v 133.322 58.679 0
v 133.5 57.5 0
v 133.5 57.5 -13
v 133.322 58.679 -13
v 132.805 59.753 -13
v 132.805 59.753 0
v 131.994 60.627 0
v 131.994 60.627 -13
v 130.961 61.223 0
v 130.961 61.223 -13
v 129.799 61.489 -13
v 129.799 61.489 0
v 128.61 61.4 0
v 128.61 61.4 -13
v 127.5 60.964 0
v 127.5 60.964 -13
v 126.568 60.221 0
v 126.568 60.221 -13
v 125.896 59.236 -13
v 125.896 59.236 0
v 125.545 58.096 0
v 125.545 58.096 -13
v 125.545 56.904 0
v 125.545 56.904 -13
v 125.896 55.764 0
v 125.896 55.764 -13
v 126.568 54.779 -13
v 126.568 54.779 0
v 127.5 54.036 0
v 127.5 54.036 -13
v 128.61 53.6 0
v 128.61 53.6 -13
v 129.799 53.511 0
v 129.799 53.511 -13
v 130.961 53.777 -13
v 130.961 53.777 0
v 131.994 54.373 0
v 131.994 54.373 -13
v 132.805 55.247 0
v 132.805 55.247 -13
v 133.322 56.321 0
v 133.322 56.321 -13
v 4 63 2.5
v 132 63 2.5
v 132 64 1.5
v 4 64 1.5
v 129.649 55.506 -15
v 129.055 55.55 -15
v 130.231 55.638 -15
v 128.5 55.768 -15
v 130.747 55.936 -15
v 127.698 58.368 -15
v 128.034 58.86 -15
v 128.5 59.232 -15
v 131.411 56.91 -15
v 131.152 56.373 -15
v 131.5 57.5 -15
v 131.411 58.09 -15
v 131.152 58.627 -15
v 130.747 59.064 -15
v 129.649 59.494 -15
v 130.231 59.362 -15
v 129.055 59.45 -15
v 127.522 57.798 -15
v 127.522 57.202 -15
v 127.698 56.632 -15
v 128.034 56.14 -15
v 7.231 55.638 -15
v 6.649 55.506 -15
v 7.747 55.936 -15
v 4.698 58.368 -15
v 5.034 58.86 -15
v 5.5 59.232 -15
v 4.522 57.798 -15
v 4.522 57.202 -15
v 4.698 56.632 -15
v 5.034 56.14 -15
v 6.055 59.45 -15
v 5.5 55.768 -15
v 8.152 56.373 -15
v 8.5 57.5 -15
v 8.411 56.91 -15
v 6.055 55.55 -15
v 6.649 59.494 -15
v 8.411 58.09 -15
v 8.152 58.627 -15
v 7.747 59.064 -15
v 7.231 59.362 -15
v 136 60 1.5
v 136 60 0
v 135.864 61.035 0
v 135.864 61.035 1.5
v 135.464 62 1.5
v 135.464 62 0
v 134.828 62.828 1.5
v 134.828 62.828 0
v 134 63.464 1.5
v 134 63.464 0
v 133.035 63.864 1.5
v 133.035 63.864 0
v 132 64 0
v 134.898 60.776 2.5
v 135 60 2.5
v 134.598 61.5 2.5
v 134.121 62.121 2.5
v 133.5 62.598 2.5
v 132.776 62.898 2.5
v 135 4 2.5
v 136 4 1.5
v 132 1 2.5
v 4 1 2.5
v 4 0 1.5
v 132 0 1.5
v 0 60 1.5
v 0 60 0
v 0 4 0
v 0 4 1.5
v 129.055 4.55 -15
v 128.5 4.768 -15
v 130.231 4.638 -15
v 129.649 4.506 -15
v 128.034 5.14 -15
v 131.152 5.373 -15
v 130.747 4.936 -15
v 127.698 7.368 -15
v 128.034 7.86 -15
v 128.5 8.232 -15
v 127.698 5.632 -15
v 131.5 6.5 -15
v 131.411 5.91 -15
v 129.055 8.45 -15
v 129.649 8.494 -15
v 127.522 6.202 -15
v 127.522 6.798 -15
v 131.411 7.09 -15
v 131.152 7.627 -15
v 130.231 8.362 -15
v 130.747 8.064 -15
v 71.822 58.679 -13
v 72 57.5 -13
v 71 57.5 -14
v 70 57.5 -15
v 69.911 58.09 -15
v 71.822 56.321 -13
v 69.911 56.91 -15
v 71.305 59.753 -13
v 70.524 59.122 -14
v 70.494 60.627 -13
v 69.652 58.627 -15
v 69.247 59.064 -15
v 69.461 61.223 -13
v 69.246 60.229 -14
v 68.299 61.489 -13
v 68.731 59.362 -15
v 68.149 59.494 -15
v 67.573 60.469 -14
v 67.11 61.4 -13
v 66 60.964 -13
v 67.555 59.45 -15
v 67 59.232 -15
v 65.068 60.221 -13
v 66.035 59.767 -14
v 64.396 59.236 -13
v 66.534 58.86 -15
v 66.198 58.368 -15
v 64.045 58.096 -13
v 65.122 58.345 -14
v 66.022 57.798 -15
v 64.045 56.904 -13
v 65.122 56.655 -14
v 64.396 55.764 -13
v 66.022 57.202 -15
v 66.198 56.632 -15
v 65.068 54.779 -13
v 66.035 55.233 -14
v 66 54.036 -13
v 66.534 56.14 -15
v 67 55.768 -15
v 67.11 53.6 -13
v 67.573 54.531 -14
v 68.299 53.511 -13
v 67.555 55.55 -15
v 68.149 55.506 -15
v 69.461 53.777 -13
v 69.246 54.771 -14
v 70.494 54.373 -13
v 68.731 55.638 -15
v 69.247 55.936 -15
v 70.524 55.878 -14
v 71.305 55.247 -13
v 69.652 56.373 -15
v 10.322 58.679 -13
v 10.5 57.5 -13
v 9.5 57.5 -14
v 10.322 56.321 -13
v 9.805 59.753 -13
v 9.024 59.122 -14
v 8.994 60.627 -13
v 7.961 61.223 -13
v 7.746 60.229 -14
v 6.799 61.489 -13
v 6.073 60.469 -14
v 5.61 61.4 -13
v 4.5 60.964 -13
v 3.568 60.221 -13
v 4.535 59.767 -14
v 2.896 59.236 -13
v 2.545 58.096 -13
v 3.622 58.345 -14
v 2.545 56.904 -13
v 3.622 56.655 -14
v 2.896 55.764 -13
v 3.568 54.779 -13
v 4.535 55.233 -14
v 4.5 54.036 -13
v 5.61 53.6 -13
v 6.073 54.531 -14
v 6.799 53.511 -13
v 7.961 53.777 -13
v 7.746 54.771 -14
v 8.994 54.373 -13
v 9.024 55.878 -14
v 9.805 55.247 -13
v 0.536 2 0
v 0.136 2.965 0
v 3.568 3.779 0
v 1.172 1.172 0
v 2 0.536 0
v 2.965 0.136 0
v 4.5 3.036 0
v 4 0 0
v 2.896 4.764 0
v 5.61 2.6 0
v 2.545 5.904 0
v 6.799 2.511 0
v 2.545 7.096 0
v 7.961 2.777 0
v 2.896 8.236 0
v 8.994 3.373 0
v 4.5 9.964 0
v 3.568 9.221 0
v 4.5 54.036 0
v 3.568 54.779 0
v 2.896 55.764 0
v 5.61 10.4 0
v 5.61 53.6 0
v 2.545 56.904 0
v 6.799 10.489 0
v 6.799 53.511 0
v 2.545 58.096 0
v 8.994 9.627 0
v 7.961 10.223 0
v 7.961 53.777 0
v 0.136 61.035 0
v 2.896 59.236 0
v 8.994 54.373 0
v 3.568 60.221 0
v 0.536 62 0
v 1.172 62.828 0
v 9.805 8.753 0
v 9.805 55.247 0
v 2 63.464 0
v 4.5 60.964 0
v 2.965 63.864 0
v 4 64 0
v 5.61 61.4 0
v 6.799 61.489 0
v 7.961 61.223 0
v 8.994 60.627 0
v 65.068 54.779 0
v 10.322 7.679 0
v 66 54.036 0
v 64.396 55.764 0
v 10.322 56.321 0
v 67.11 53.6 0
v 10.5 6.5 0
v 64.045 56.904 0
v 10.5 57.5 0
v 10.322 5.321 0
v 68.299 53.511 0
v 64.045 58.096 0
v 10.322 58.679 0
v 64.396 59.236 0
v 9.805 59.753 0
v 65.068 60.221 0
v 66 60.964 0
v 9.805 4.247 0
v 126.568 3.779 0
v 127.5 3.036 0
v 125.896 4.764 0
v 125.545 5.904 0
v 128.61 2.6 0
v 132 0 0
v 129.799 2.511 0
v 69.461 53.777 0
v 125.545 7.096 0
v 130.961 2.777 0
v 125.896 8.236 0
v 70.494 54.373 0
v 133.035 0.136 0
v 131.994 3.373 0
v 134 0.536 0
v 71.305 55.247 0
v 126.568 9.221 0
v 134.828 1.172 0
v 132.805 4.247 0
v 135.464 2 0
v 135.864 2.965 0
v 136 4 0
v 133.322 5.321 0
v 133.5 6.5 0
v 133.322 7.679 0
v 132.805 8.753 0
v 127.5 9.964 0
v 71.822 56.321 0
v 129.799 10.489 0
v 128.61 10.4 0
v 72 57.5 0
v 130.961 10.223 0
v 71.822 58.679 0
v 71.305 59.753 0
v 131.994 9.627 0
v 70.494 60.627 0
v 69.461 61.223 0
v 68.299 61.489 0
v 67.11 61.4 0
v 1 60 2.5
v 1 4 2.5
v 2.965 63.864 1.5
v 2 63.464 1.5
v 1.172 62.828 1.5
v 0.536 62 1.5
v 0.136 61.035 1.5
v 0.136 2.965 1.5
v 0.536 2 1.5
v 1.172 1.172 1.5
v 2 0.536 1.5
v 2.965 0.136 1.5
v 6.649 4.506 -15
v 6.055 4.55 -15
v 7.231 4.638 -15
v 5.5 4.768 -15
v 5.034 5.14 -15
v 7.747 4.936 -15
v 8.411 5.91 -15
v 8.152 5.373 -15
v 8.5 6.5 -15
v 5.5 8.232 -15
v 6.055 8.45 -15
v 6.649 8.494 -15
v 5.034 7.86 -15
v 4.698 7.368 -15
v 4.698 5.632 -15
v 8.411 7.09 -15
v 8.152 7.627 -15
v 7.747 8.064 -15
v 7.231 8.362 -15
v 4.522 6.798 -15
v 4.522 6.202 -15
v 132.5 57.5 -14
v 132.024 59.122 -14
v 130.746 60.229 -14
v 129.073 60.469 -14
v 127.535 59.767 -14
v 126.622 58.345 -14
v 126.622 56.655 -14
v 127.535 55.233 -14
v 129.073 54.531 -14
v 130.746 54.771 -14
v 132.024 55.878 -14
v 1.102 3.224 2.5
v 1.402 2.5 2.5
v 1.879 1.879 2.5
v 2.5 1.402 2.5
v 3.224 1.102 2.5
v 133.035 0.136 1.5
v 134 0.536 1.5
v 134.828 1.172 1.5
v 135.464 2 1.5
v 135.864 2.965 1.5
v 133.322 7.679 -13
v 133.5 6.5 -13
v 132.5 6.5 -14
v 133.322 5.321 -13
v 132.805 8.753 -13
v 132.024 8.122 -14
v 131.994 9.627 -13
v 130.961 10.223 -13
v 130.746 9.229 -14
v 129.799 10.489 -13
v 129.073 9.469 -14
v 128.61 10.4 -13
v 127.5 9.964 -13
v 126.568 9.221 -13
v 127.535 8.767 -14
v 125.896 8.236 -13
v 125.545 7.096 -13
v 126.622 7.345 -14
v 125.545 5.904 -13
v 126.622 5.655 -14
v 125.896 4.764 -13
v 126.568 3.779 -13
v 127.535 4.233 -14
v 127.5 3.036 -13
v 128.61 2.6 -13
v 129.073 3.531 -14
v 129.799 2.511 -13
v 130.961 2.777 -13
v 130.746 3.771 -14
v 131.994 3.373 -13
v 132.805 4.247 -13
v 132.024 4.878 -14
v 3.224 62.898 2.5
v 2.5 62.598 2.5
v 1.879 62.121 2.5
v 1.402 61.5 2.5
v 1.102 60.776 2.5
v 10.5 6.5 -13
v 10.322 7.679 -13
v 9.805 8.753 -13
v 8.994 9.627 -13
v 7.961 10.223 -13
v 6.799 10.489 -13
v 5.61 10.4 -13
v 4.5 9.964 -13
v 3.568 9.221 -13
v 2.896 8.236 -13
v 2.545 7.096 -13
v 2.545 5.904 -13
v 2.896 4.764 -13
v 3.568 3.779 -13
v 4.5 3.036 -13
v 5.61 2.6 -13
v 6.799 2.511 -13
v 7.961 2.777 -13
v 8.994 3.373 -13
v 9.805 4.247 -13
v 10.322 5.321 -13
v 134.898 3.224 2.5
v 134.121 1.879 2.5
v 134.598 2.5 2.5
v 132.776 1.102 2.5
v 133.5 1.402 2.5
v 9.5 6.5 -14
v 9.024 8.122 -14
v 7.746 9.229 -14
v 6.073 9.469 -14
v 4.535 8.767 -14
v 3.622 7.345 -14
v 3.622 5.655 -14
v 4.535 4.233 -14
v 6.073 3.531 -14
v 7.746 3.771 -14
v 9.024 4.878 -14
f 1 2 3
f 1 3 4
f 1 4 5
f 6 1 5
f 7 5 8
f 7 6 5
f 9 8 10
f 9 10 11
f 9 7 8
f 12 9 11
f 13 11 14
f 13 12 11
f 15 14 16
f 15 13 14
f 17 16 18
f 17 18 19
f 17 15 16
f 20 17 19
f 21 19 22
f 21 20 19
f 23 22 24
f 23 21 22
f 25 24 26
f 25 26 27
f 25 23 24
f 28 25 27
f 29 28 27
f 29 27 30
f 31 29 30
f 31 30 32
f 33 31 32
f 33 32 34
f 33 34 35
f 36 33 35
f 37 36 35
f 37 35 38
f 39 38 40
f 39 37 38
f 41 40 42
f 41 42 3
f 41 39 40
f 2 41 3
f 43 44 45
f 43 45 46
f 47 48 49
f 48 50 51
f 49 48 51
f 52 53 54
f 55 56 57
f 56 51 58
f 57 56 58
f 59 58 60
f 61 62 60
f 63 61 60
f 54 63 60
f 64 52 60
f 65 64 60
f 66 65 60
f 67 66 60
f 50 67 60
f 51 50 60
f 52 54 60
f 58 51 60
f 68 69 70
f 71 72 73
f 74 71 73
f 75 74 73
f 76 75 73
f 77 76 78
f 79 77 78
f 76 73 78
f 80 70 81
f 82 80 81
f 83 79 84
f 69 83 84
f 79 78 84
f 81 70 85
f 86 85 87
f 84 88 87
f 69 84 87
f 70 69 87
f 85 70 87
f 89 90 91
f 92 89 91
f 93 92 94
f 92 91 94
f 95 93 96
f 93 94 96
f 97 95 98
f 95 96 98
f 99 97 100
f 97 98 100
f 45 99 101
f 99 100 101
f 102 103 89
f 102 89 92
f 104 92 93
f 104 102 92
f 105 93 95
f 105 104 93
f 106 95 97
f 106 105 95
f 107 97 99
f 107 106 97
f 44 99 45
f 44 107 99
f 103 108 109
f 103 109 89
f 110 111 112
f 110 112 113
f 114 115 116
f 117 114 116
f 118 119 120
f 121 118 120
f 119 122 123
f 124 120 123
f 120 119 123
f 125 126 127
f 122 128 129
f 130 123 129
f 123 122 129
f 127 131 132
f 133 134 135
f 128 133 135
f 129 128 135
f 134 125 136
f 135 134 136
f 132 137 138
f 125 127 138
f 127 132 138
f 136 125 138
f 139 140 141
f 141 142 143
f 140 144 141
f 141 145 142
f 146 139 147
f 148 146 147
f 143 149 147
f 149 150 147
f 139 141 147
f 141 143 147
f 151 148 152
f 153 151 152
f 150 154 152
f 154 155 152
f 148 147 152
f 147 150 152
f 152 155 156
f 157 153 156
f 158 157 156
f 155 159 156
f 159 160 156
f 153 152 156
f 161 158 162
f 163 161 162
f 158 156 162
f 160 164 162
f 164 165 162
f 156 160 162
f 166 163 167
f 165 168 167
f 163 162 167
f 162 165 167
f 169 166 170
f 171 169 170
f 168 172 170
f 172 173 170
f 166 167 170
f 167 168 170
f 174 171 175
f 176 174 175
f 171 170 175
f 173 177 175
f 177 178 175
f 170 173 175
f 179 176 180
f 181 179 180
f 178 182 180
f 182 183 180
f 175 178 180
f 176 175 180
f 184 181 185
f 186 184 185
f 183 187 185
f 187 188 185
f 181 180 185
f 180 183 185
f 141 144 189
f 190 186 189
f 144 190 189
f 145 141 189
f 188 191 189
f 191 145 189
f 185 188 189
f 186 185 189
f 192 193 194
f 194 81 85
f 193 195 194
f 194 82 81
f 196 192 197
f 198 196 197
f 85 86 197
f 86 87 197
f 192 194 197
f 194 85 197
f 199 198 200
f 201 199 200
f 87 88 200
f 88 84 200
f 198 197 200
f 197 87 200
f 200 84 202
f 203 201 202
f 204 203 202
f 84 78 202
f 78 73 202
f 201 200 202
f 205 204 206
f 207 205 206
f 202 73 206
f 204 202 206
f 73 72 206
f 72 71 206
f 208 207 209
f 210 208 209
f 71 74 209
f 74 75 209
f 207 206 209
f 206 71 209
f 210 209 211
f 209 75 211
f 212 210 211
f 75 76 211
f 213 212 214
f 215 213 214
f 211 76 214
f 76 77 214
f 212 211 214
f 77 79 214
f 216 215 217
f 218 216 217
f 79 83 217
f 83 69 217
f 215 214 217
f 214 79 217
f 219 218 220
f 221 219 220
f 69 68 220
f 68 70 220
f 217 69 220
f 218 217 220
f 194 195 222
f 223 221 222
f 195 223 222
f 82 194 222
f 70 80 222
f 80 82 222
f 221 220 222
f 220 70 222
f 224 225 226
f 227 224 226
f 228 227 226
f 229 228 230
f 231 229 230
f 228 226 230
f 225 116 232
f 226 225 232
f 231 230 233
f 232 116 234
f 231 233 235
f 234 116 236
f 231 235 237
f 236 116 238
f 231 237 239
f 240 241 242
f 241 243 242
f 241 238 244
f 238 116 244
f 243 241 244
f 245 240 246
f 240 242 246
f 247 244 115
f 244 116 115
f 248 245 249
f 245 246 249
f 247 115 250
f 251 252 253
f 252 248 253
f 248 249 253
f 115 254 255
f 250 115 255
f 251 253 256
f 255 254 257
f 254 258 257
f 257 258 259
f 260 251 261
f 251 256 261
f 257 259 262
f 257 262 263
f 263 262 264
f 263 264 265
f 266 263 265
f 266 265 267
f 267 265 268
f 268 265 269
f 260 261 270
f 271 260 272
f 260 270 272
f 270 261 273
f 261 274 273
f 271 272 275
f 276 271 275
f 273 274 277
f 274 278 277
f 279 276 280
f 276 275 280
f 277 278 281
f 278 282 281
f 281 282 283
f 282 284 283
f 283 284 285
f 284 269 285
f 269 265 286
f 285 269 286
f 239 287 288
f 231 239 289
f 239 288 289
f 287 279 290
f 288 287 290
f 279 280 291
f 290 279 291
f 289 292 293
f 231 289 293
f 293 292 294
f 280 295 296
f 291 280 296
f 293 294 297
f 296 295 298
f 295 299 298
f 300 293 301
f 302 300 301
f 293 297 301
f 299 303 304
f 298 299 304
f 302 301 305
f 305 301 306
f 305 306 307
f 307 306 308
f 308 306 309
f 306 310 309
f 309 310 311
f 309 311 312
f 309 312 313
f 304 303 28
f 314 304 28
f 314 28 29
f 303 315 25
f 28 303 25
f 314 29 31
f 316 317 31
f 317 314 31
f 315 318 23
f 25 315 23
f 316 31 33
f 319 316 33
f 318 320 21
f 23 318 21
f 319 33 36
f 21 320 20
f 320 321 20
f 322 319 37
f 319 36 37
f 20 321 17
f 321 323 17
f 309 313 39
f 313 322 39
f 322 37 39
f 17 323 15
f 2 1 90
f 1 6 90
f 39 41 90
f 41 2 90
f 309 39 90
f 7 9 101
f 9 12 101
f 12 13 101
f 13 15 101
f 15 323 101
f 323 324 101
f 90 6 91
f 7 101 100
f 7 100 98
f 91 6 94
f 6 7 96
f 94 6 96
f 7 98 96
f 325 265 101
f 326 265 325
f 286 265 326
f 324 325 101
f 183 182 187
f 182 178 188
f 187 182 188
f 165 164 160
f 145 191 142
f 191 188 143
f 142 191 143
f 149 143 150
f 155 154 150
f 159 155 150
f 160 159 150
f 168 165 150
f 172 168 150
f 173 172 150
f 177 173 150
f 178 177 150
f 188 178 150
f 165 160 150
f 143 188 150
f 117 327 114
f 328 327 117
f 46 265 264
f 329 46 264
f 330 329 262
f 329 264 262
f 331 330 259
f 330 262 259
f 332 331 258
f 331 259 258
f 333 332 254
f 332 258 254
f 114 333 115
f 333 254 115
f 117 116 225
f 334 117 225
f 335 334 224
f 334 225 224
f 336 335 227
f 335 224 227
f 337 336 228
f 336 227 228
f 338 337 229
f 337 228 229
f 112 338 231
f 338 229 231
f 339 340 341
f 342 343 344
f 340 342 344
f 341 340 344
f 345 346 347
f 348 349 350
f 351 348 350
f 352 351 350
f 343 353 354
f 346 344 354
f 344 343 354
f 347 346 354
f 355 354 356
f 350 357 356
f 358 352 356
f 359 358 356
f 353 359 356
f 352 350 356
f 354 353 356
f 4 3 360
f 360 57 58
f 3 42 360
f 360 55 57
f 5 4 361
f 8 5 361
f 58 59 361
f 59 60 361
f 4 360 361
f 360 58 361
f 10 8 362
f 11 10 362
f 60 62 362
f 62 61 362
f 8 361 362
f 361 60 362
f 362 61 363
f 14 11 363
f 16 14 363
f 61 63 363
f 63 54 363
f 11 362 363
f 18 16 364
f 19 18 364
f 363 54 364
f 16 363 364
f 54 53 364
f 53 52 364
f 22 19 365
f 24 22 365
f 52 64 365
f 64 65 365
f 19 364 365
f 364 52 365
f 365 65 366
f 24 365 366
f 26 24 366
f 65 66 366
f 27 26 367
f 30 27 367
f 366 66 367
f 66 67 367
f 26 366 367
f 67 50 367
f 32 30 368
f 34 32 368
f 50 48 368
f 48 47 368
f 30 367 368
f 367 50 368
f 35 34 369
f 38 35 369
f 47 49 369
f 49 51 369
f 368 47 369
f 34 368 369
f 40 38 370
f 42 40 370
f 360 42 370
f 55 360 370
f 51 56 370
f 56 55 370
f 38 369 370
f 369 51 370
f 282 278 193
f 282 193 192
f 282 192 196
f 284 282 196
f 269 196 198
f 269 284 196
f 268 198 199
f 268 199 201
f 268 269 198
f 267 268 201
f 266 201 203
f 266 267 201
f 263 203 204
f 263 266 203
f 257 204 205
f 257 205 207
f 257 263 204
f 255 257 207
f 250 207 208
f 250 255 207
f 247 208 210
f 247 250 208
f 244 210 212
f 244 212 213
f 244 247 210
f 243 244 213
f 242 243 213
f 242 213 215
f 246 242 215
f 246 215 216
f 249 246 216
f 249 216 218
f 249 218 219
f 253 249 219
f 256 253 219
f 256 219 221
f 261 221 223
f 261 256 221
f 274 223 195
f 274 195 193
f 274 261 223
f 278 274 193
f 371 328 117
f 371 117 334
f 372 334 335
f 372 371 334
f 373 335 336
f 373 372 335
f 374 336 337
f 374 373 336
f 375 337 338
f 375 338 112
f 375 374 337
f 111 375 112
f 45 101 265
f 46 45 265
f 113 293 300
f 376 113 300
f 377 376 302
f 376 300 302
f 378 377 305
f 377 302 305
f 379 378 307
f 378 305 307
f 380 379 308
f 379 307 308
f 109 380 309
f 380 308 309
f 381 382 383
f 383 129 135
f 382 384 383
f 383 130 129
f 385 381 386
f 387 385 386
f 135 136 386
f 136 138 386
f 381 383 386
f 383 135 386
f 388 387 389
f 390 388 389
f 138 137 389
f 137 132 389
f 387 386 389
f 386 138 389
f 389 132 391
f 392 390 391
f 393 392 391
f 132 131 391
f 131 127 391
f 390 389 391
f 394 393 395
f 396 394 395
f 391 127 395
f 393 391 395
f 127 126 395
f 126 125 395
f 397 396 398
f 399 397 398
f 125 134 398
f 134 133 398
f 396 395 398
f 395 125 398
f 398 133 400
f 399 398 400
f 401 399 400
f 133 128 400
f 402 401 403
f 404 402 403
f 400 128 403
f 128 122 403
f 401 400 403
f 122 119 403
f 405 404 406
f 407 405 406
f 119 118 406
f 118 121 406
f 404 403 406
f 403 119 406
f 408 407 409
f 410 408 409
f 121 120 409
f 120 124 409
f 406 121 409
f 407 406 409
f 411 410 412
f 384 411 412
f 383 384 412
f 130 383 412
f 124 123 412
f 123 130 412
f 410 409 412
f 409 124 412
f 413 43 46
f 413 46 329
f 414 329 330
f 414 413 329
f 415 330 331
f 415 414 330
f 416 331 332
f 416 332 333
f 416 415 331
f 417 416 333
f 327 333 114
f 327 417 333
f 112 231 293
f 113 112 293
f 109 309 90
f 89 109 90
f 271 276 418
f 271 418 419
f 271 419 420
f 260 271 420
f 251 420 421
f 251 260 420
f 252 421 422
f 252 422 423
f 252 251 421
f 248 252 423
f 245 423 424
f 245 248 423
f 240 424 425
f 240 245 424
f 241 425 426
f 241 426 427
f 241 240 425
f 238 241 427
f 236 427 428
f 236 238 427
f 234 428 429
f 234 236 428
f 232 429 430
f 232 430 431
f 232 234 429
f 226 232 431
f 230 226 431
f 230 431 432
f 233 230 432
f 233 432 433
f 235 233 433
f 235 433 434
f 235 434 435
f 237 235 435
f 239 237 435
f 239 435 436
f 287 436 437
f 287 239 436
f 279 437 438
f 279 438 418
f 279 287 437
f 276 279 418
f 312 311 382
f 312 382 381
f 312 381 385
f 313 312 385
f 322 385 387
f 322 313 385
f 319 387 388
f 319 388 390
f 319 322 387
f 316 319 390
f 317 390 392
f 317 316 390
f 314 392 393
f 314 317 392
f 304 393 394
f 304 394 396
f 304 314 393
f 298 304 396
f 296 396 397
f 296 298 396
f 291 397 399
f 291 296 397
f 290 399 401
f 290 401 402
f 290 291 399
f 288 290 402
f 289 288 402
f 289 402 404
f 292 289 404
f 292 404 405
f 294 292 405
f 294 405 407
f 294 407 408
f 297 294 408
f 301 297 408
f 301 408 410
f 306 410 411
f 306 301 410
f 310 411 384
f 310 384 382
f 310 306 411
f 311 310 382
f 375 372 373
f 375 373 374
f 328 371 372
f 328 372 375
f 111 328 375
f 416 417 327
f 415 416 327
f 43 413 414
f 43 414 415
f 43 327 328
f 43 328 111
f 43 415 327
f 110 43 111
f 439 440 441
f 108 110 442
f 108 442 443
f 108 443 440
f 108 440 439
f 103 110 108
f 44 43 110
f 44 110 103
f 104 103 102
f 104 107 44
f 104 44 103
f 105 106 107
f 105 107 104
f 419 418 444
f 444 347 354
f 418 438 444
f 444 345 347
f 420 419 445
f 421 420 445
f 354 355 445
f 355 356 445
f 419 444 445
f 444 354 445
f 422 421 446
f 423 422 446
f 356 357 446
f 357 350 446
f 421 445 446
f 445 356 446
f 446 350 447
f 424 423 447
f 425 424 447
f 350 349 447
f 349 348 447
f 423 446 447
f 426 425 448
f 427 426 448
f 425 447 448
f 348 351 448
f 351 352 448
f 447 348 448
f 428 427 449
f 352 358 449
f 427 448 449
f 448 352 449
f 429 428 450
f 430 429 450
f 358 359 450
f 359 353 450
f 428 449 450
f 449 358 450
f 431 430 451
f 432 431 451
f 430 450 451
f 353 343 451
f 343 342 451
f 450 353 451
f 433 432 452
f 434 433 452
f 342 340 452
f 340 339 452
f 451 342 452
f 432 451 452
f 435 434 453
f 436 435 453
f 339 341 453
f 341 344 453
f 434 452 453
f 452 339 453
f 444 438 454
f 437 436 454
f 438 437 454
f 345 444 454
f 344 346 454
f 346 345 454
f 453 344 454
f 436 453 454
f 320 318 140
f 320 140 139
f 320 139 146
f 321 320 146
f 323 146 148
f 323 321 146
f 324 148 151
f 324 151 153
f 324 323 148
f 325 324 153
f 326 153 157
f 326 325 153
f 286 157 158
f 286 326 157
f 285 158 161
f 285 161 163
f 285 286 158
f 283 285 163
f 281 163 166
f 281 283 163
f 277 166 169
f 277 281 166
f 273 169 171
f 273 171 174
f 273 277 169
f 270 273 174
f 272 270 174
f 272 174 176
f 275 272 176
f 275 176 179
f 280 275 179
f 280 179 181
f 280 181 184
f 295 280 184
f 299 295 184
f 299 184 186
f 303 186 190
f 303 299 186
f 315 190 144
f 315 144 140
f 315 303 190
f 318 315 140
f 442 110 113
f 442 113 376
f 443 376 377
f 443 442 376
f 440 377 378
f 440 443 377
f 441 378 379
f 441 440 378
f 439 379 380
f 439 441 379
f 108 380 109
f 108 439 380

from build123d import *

# Parameters (mm, degrees)
PAD_DEPTH       = 2.5
SKETCH002_R     = 4
PAD001_DEPTH    = 15
CHAMFER_SIZE    = 1
CHAMFER001_SIZE = 2


with BuildPart() as part:
    # Sketch → Pad (new body)
    with BuildSketch(Plane.XY):
        with BuildLine():
            Line((4, 0), (132, 0))
            ThreePointArc((132, 0), (134.828427, 1.171573), (136, 4))
            Line((136, 4), (136, 60))
            ThreePointArc((136, 60), (134.828427, 62.828427), (132, 64))
            Line((132, 64), (4, 64))
            ThreePointArc((4, 64), (1.171573, 62.828427), (0, 60))
            Line((0, 60), (0, 4))
            ThreePointArc((0, 4), (1.171573, 1.171573), (4, 0))
        make_face()
    extrude(amount=PAD_DEPTH)

    # Sketch002 → Pad001 (join)
    with BuildSketch(Plane.XY):
        with Locations((6.5, 6.5)):
            Circle(SKETCH002_R)
        with Locations((129.5, 6.5)):
            Circle(SKETCH002_R)
        with Locations((129.5, 57.5)):
            Circle(SKETCH002_R)
        with Locations((6.5, 57.5)):
            Circle(SKETCH002_R)
        with Locations((68, 57.5)):
            Circle(SKETCH002_R)
    extrude(amount=-PAD001_DEPTH)

    # Chamfer
    chamfer_edges = [part.edges().sort_by_distance(p)[0] for p in [
        (68, 0, 2.5),
        (134.828427, 1.171573, 2.5),
        (136, 32, 2.5),
        (134.828427, 62.828427, 2.5),
        (68, 64, 2.5),
        (1.171573, 62.828427, 2.5),
        (0, 32, 2.5),
        (1.171573, 1.171573, 2.5),
    ]]
    chamfer(chamfer_edges, length=CHAMFER_SIZE)

    # Chamfer001
    chamfer001_edges = [part.edges().sort_by_distance(p)[0] for p in [
        (2.5, 6.5, -15),
        (2.5, 57.5, -15),
        (64, 57.5, -15),
        (125.5, 57.5, -15),
        (125.5, 6.5, -15),
    ]]
    chamfer(chamfer001_edges, length=CHAMFER001_SIZE)


solid = part.part
